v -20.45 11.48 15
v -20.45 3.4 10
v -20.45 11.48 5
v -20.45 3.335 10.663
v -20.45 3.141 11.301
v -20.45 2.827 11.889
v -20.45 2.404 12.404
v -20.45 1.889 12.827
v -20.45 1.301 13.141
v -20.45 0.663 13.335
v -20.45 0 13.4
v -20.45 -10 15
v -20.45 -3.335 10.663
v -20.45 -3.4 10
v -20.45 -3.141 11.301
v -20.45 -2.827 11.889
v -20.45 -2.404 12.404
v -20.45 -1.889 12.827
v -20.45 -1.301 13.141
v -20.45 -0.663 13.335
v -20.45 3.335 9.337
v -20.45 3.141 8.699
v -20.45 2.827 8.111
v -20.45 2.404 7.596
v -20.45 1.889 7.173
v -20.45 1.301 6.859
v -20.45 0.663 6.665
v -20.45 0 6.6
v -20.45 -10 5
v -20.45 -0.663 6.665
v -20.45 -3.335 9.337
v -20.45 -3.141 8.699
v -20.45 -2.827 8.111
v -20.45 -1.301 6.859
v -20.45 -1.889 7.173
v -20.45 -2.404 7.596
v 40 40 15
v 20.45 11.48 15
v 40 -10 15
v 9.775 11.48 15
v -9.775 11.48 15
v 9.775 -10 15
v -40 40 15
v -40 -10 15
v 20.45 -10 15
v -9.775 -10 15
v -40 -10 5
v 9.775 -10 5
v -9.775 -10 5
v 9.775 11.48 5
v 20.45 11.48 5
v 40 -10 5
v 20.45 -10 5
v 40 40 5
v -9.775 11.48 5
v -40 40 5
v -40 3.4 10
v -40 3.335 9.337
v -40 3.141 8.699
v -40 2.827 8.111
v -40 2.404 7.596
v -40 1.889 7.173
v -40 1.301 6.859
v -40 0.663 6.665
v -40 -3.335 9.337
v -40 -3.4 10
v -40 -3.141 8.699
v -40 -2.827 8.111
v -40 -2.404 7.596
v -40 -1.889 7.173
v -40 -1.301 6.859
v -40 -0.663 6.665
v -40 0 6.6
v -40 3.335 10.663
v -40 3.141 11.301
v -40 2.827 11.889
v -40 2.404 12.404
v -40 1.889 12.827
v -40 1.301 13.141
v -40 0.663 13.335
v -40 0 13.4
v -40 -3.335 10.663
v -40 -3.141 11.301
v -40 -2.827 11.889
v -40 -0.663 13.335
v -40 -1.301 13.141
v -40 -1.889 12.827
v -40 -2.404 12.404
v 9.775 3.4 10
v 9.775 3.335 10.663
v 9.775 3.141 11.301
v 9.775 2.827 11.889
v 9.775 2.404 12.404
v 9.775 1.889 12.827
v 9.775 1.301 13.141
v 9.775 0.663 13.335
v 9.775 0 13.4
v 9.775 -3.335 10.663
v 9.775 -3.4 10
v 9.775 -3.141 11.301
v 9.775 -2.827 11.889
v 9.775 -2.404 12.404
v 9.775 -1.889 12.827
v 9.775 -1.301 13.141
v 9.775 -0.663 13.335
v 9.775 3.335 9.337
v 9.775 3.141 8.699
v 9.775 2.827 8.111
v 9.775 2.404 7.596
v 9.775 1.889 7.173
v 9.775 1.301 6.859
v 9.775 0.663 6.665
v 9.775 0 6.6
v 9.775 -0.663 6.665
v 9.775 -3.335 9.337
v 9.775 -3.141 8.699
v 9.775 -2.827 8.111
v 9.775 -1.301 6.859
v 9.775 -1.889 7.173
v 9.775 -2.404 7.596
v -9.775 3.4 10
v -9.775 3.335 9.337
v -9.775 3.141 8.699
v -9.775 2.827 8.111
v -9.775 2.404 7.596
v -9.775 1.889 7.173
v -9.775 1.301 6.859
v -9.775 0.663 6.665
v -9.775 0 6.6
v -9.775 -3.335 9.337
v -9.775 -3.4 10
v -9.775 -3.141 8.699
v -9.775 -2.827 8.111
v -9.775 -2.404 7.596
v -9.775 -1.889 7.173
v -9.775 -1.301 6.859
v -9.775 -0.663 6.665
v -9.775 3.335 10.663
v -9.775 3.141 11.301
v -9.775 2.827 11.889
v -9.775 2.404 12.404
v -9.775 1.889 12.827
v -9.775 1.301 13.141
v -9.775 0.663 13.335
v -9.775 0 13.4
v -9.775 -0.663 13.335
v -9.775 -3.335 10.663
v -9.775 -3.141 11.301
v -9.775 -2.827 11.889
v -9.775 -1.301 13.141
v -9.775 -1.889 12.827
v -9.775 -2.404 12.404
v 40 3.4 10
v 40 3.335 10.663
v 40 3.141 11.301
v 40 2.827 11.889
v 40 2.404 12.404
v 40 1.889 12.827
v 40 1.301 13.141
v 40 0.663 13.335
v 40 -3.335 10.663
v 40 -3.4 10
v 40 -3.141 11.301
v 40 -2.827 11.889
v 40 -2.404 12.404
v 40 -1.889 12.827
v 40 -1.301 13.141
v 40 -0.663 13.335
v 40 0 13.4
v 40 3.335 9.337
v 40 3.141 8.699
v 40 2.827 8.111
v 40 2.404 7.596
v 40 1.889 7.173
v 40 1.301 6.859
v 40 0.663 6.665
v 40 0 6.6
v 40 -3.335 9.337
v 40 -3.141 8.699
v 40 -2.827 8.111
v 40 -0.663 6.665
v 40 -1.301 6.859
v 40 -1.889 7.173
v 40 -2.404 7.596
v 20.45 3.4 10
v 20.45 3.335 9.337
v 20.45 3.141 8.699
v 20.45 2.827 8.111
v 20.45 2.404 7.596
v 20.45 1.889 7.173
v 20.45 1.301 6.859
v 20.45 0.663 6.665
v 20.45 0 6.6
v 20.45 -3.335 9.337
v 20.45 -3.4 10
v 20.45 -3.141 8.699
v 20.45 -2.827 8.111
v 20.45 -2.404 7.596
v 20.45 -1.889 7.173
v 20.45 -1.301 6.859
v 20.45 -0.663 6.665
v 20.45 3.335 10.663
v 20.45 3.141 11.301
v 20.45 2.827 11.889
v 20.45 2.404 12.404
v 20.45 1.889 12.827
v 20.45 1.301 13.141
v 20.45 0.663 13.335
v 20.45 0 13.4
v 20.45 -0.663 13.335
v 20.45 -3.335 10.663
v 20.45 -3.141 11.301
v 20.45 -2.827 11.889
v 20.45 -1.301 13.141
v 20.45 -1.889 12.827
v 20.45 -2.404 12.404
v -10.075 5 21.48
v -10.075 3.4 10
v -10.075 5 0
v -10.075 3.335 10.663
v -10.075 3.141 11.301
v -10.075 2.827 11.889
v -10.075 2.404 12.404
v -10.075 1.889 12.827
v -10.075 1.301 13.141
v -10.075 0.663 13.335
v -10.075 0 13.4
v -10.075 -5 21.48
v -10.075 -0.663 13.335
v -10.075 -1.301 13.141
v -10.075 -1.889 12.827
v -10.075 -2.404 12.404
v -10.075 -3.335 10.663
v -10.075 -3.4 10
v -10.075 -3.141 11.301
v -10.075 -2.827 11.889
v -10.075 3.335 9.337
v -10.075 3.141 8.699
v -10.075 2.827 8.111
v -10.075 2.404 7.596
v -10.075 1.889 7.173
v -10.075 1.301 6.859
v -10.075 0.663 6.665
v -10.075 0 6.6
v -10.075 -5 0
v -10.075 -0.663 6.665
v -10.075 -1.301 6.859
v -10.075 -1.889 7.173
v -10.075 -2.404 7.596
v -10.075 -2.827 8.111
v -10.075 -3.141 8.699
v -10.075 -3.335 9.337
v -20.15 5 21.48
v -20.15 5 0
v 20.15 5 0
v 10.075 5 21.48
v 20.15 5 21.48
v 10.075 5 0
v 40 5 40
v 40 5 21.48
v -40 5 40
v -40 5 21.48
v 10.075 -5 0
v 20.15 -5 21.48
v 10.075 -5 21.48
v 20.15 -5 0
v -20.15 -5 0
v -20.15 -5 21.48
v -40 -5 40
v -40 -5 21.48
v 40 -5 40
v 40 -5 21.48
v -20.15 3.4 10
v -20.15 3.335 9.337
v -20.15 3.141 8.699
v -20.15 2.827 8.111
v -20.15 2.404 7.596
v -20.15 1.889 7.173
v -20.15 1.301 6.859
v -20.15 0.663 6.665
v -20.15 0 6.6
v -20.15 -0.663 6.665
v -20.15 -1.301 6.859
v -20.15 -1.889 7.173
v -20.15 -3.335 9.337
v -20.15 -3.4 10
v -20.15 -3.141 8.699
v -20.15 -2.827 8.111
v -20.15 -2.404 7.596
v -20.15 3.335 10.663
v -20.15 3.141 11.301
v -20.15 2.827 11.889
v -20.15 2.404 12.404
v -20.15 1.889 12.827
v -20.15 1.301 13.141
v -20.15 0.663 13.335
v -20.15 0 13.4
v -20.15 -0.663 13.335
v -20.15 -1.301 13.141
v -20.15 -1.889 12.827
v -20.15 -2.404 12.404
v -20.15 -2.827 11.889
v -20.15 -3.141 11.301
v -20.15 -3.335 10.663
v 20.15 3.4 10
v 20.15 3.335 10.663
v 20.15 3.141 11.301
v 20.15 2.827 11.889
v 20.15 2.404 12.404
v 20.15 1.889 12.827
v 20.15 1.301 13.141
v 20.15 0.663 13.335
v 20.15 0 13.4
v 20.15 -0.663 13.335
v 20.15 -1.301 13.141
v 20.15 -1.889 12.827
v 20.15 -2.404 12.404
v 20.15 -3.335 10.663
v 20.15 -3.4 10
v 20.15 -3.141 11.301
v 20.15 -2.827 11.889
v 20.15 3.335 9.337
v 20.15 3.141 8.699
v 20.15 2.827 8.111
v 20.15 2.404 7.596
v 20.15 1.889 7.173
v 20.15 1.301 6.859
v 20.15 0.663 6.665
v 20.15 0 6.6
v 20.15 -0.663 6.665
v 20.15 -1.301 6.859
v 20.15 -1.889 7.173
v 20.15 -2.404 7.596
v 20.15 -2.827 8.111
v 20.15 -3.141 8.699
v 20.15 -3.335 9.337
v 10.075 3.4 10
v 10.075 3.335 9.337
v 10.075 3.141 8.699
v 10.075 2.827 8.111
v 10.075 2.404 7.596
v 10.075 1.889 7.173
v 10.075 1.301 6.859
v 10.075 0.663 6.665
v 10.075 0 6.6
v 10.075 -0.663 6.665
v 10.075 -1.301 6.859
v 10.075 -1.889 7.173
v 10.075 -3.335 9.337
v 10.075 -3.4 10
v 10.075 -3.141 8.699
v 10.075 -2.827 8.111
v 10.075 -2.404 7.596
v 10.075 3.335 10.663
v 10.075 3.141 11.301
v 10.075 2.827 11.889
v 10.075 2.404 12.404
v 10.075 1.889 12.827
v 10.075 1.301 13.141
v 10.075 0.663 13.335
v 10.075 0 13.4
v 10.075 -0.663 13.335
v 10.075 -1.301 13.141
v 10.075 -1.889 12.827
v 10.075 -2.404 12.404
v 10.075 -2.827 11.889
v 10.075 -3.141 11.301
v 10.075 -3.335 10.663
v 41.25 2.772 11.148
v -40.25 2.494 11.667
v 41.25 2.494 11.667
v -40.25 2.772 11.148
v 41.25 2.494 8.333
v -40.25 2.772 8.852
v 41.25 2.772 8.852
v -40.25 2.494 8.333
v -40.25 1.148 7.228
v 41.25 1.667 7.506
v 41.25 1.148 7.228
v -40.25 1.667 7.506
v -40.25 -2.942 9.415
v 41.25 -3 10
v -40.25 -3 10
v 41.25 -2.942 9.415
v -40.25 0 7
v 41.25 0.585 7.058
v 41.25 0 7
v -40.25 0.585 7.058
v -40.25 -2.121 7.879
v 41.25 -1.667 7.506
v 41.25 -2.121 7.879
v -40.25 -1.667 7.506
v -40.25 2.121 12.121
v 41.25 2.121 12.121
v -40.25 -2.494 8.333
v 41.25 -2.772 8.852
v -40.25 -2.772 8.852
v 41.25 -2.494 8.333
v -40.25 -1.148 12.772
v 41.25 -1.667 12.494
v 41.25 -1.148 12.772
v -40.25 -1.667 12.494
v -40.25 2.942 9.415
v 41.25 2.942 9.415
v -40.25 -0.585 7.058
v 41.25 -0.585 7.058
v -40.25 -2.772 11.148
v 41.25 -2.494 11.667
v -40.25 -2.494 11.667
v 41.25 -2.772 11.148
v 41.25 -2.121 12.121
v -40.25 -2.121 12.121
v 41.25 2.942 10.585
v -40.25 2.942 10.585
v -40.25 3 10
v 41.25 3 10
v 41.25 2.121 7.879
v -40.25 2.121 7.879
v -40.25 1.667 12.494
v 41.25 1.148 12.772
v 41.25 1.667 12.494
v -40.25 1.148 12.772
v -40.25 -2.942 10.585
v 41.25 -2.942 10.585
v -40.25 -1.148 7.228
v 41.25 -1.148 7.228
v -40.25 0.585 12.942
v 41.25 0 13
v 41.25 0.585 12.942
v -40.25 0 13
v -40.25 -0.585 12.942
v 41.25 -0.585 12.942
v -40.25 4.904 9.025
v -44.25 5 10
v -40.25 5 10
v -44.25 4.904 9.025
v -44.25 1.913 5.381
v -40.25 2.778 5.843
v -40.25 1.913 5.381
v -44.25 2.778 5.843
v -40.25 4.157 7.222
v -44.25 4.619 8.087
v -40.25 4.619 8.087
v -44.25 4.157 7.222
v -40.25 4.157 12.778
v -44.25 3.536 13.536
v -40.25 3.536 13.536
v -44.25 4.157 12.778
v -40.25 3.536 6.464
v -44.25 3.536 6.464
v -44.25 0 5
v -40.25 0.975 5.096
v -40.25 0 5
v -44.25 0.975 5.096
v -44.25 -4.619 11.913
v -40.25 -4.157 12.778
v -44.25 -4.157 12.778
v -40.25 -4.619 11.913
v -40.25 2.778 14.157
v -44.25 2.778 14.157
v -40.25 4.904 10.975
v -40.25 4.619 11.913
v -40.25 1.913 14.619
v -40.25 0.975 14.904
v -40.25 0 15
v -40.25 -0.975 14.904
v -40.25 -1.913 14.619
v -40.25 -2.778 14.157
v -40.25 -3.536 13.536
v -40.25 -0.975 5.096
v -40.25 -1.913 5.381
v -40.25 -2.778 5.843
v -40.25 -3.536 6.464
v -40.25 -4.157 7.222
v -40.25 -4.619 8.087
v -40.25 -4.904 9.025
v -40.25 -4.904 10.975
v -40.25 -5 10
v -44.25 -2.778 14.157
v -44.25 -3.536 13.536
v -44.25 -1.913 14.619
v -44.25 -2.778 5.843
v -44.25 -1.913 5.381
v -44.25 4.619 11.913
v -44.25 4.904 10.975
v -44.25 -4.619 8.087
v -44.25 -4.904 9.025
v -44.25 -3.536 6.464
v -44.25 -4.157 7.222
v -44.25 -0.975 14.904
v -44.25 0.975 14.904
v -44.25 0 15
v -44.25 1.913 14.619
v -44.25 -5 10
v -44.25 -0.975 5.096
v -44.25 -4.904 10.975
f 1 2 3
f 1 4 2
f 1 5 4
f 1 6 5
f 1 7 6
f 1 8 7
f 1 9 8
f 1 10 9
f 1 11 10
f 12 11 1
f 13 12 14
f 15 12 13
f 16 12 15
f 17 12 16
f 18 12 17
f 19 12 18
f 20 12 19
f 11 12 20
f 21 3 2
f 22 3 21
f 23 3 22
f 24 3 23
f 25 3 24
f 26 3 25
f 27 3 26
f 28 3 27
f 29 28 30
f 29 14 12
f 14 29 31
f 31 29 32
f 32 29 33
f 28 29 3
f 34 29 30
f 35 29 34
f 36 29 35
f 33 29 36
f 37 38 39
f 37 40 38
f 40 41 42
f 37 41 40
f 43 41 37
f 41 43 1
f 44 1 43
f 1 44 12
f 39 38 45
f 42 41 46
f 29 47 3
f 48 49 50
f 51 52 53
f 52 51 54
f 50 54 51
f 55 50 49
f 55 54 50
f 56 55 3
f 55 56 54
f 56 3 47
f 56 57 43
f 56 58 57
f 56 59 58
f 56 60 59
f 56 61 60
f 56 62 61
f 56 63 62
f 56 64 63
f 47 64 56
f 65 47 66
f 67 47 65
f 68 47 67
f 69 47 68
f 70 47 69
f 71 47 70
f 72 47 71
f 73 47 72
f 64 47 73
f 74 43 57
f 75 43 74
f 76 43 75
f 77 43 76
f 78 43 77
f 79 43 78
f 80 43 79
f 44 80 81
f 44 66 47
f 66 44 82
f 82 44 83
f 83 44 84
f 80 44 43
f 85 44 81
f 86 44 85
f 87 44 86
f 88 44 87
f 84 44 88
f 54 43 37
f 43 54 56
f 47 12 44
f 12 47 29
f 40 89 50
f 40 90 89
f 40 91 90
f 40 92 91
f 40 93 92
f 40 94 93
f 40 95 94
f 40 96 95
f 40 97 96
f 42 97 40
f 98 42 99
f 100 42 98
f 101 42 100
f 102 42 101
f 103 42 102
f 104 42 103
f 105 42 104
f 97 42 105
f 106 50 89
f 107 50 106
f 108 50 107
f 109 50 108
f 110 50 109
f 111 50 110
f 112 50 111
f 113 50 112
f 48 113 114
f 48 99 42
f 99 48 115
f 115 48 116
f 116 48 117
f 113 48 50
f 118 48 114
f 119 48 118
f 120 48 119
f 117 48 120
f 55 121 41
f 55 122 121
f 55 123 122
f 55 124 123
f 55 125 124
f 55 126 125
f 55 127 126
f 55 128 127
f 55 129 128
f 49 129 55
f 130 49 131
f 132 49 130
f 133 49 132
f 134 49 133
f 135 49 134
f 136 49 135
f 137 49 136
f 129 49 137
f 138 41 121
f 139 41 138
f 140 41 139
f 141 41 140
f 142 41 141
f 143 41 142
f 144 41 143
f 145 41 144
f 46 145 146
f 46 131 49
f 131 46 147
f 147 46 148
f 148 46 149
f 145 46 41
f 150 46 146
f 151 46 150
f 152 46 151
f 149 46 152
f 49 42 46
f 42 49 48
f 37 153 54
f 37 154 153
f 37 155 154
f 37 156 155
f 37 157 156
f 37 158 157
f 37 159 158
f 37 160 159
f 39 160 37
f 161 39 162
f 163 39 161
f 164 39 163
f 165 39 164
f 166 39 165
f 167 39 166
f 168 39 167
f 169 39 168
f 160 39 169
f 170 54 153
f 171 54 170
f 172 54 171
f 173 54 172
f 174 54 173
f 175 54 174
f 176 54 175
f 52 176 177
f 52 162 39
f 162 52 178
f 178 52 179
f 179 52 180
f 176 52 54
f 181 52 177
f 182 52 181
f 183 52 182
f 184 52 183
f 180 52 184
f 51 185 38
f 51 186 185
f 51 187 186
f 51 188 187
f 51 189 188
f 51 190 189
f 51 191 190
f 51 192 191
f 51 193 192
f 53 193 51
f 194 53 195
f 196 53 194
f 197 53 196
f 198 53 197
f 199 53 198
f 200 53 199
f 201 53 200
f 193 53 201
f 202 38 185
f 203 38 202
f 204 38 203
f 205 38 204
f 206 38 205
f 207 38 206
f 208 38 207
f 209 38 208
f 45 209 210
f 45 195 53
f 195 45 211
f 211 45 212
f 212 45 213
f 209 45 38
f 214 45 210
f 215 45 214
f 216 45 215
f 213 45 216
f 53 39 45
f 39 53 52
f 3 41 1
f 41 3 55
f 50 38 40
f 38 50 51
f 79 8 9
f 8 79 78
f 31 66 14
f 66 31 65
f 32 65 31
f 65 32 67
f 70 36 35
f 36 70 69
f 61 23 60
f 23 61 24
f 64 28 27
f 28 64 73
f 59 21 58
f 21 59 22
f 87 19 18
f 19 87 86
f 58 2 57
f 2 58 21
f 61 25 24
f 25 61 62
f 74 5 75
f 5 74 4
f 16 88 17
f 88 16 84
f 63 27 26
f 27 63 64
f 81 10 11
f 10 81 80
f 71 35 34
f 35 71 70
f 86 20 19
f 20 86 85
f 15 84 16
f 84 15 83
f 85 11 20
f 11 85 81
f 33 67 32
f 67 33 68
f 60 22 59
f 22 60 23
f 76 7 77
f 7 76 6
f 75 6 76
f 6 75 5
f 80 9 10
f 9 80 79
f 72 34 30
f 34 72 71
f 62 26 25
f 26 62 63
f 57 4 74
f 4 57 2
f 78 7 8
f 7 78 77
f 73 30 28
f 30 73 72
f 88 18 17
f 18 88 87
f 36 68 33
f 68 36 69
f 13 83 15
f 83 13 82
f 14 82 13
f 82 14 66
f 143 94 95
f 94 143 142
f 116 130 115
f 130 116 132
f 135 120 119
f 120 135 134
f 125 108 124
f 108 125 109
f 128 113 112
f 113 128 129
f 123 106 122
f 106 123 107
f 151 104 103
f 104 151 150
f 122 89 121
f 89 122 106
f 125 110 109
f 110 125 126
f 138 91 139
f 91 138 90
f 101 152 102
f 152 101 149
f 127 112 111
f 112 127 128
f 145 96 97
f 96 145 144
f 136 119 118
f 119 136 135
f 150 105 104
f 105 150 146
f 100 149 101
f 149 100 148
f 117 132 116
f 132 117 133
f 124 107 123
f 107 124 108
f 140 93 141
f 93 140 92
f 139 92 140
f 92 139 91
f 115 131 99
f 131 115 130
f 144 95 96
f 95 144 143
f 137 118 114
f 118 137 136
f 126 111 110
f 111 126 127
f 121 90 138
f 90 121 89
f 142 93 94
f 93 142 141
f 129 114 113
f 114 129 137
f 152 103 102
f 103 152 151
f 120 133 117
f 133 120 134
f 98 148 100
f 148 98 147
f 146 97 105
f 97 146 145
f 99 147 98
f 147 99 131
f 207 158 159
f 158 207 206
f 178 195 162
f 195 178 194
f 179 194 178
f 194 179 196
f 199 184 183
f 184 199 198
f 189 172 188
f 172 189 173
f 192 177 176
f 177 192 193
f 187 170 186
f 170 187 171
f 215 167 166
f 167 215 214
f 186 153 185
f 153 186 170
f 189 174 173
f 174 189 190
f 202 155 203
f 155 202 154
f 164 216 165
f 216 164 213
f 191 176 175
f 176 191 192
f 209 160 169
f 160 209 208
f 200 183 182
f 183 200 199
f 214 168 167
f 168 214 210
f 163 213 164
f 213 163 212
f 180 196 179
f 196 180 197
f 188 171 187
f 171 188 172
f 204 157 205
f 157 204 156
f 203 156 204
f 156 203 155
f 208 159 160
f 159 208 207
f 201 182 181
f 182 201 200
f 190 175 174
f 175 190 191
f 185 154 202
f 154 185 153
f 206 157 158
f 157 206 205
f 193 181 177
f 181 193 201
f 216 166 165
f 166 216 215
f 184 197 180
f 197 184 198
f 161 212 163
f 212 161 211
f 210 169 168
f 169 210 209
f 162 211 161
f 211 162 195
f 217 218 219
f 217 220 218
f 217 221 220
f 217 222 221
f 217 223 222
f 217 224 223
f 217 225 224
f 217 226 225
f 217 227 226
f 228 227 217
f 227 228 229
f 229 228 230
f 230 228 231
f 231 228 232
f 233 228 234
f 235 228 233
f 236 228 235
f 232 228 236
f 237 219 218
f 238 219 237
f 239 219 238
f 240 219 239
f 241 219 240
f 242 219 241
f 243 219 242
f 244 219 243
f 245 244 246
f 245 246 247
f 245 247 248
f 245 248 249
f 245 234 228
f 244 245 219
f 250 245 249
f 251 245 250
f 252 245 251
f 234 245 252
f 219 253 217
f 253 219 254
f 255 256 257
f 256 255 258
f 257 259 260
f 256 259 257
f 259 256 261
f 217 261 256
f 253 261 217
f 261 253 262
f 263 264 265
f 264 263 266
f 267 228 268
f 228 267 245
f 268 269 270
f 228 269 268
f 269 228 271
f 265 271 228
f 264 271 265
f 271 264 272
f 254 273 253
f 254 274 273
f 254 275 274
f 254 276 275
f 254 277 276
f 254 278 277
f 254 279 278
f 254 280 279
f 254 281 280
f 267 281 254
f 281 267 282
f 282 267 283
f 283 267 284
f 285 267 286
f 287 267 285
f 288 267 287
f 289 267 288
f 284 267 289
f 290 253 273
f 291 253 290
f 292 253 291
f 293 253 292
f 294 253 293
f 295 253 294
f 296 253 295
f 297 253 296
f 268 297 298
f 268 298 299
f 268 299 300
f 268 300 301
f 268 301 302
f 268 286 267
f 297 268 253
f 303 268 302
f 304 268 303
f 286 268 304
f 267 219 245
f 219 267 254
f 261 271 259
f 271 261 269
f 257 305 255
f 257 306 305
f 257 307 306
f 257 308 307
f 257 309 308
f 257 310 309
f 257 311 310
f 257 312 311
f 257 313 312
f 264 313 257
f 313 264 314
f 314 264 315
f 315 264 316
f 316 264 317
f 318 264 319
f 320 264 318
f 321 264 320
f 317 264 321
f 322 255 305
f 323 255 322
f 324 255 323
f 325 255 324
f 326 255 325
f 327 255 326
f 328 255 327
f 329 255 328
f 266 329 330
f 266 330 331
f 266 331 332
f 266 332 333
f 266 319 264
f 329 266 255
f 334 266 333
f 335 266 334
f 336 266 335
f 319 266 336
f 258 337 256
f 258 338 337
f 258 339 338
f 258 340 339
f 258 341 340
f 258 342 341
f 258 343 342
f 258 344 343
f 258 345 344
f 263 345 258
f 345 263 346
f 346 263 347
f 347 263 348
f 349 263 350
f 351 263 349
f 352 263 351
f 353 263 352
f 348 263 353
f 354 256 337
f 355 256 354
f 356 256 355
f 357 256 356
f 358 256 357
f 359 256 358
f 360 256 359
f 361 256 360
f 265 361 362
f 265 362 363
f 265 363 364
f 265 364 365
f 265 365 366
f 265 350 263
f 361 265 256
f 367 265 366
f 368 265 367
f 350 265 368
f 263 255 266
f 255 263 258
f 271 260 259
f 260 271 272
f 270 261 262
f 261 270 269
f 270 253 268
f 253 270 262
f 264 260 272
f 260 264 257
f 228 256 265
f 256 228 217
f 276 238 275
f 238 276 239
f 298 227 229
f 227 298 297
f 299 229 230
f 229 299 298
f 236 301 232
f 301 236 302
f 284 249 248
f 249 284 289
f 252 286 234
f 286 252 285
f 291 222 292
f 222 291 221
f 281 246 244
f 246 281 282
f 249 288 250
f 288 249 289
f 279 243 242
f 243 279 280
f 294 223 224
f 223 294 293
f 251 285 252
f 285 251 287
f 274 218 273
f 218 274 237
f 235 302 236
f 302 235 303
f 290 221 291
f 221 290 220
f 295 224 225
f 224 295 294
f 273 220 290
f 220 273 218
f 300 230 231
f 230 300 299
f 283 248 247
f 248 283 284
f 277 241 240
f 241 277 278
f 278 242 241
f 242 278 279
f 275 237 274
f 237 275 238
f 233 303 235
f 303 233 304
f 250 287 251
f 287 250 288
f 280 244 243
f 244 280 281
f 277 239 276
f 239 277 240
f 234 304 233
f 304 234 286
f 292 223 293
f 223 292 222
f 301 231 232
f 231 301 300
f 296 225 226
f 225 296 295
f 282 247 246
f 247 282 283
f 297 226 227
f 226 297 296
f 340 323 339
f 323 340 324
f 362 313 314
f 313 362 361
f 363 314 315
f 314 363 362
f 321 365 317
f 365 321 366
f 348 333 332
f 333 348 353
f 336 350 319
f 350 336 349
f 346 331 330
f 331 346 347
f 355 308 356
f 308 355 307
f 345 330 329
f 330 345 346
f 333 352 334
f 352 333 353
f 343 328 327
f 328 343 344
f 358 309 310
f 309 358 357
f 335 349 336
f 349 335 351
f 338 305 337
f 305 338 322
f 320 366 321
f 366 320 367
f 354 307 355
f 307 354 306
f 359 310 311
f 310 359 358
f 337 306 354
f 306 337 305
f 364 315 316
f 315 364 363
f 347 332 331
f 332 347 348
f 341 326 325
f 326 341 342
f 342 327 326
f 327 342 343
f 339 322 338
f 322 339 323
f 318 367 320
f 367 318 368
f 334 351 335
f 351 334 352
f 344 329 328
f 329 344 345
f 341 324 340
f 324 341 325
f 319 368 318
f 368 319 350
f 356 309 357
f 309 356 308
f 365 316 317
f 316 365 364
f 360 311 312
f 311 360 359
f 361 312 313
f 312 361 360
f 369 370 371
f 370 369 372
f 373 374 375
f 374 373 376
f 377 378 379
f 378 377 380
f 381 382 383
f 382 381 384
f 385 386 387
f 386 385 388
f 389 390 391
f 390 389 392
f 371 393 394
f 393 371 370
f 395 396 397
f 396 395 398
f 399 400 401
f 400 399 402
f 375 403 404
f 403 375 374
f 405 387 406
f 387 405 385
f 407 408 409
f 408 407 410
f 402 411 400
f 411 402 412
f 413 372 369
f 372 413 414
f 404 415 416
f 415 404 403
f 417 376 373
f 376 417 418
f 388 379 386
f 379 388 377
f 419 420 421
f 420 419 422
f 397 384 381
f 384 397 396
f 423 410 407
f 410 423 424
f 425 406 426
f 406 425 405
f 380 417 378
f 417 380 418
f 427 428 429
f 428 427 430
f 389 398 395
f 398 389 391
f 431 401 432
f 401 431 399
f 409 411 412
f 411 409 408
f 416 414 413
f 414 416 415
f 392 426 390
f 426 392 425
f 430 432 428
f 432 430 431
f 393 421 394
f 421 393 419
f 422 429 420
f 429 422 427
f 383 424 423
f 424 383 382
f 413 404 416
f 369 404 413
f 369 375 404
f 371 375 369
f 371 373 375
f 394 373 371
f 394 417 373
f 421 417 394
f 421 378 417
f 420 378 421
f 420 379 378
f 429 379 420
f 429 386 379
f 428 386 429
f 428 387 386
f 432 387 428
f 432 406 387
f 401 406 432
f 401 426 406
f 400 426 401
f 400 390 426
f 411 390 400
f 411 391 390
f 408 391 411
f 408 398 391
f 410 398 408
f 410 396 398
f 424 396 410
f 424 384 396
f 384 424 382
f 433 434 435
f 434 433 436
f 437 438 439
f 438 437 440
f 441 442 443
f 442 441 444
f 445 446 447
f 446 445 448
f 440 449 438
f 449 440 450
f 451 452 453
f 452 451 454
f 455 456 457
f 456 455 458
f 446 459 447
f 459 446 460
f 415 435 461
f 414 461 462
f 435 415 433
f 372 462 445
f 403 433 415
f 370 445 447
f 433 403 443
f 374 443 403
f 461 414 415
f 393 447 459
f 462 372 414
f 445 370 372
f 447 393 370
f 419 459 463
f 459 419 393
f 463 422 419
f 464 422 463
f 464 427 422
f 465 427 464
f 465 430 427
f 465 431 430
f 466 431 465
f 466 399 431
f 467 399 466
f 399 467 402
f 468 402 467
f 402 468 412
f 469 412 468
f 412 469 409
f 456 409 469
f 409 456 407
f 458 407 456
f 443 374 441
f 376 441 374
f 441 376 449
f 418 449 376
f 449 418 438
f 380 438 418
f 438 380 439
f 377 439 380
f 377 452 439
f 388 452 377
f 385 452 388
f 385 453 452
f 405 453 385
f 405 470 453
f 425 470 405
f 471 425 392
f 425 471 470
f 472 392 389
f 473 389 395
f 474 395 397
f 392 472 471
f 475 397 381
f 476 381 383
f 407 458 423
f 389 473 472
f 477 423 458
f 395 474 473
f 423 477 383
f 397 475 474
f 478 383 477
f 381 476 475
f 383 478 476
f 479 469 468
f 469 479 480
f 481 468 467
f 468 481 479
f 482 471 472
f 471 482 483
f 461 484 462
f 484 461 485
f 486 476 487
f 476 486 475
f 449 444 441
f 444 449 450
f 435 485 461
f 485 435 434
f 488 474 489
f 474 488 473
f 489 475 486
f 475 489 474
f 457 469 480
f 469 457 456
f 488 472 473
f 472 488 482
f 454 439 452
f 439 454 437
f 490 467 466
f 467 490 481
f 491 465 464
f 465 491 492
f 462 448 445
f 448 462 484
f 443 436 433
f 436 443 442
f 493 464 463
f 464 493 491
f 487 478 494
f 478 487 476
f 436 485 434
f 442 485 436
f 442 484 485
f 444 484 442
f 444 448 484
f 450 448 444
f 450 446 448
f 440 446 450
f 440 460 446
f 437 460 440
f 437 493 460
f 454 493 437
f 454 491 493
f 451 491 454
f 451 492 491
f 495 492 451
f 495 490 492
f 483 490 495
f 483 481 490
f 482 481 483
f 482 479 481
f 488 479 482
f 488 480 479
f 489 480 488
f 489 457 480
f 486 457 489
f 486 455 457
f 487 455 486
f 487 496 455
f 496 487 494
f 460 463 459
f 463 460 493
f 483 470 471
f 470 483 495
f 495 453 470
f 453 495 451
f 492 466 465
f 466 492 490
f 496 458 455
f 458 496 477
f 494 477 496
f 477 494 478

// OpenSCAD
$fn = 32;

// ------------------------------------------------------------------------
// Butt hinge: hinge 80 mm, leaf swung 270 deg
// Every part is its own module, assembly() places every instance.
// ------------------------------------------------------------------------

// --- part 1 ---
module hinge_base() {
  difference() {
    union() {
      translate([-40, -10, -5]) cube([19.55, 50, 10]);
      translate([-9.775, -10, -5]) cube([19.55, 50, 10]);
      translate([20.45, -10, -5]) cube([19.55, 50, 10]);
      translate([-40, 11.48, -5]) cube([80, 28.52, 10]);
    }
    translate([-30.225, 0, 0]) rotate([0, 90, 0]) cylinder(h = 21.55, d = 6.8, center = true);
    translate([0, 0, 0]) rotate([0, 90, 0]) cylinder(h = 21.55, d = 6.8, center = true);
    translate([30.225, 0, 0]) rotate([0, 90, 0]) cylinder(h = 21.55, d = 6.8, center = true);
  }
}

// --- part 2 ---
module hinge_mover() {
  difference() {
    union() {
      translate([-20.15, -30, -5]) cube([10.075, 40, 10]);
      translate([10.075, -30, -5]) cube([10.075, 40, 10]);
      translate([-40, -30, -5]) cube([80, 18.52, 10]);
    }
    translate([-15.113, 0, 0]) rotate([0, 90, 0]) cylinder(h = 12.075, d = 6.8, center = true);
    translate([15.113, 0, 0]) rotate([0, 90, 0]) cylinder(h = 12.075, d = 6.8, center = true);
  }
}

// --- part 3 ---
module hinge_pin() {
  rotate([0, 90, 0]) cylinder(h = 82.5, d = 6, center = true);
  translate([-44.25, 0, 0]) rotate([0, 90, 0]) cylinder(h = 4, d = 10);
}

// --- assembly ---
module assembly() {
  color([0.80, 0.24, 0.20]) translate([0, 0, 10]) rotate([0, 0, 0]) hinge_base();
  color([0.20, 0.45, 0.75]) translate([0, 0, 10]) rotate([270, 0, 0]) hinge_mover();
  color([0.25, 0.62, 0.32]) translate([0, 0, 10]) rotate([0, 0, 0]) hinge_pin();
}

assembly();
